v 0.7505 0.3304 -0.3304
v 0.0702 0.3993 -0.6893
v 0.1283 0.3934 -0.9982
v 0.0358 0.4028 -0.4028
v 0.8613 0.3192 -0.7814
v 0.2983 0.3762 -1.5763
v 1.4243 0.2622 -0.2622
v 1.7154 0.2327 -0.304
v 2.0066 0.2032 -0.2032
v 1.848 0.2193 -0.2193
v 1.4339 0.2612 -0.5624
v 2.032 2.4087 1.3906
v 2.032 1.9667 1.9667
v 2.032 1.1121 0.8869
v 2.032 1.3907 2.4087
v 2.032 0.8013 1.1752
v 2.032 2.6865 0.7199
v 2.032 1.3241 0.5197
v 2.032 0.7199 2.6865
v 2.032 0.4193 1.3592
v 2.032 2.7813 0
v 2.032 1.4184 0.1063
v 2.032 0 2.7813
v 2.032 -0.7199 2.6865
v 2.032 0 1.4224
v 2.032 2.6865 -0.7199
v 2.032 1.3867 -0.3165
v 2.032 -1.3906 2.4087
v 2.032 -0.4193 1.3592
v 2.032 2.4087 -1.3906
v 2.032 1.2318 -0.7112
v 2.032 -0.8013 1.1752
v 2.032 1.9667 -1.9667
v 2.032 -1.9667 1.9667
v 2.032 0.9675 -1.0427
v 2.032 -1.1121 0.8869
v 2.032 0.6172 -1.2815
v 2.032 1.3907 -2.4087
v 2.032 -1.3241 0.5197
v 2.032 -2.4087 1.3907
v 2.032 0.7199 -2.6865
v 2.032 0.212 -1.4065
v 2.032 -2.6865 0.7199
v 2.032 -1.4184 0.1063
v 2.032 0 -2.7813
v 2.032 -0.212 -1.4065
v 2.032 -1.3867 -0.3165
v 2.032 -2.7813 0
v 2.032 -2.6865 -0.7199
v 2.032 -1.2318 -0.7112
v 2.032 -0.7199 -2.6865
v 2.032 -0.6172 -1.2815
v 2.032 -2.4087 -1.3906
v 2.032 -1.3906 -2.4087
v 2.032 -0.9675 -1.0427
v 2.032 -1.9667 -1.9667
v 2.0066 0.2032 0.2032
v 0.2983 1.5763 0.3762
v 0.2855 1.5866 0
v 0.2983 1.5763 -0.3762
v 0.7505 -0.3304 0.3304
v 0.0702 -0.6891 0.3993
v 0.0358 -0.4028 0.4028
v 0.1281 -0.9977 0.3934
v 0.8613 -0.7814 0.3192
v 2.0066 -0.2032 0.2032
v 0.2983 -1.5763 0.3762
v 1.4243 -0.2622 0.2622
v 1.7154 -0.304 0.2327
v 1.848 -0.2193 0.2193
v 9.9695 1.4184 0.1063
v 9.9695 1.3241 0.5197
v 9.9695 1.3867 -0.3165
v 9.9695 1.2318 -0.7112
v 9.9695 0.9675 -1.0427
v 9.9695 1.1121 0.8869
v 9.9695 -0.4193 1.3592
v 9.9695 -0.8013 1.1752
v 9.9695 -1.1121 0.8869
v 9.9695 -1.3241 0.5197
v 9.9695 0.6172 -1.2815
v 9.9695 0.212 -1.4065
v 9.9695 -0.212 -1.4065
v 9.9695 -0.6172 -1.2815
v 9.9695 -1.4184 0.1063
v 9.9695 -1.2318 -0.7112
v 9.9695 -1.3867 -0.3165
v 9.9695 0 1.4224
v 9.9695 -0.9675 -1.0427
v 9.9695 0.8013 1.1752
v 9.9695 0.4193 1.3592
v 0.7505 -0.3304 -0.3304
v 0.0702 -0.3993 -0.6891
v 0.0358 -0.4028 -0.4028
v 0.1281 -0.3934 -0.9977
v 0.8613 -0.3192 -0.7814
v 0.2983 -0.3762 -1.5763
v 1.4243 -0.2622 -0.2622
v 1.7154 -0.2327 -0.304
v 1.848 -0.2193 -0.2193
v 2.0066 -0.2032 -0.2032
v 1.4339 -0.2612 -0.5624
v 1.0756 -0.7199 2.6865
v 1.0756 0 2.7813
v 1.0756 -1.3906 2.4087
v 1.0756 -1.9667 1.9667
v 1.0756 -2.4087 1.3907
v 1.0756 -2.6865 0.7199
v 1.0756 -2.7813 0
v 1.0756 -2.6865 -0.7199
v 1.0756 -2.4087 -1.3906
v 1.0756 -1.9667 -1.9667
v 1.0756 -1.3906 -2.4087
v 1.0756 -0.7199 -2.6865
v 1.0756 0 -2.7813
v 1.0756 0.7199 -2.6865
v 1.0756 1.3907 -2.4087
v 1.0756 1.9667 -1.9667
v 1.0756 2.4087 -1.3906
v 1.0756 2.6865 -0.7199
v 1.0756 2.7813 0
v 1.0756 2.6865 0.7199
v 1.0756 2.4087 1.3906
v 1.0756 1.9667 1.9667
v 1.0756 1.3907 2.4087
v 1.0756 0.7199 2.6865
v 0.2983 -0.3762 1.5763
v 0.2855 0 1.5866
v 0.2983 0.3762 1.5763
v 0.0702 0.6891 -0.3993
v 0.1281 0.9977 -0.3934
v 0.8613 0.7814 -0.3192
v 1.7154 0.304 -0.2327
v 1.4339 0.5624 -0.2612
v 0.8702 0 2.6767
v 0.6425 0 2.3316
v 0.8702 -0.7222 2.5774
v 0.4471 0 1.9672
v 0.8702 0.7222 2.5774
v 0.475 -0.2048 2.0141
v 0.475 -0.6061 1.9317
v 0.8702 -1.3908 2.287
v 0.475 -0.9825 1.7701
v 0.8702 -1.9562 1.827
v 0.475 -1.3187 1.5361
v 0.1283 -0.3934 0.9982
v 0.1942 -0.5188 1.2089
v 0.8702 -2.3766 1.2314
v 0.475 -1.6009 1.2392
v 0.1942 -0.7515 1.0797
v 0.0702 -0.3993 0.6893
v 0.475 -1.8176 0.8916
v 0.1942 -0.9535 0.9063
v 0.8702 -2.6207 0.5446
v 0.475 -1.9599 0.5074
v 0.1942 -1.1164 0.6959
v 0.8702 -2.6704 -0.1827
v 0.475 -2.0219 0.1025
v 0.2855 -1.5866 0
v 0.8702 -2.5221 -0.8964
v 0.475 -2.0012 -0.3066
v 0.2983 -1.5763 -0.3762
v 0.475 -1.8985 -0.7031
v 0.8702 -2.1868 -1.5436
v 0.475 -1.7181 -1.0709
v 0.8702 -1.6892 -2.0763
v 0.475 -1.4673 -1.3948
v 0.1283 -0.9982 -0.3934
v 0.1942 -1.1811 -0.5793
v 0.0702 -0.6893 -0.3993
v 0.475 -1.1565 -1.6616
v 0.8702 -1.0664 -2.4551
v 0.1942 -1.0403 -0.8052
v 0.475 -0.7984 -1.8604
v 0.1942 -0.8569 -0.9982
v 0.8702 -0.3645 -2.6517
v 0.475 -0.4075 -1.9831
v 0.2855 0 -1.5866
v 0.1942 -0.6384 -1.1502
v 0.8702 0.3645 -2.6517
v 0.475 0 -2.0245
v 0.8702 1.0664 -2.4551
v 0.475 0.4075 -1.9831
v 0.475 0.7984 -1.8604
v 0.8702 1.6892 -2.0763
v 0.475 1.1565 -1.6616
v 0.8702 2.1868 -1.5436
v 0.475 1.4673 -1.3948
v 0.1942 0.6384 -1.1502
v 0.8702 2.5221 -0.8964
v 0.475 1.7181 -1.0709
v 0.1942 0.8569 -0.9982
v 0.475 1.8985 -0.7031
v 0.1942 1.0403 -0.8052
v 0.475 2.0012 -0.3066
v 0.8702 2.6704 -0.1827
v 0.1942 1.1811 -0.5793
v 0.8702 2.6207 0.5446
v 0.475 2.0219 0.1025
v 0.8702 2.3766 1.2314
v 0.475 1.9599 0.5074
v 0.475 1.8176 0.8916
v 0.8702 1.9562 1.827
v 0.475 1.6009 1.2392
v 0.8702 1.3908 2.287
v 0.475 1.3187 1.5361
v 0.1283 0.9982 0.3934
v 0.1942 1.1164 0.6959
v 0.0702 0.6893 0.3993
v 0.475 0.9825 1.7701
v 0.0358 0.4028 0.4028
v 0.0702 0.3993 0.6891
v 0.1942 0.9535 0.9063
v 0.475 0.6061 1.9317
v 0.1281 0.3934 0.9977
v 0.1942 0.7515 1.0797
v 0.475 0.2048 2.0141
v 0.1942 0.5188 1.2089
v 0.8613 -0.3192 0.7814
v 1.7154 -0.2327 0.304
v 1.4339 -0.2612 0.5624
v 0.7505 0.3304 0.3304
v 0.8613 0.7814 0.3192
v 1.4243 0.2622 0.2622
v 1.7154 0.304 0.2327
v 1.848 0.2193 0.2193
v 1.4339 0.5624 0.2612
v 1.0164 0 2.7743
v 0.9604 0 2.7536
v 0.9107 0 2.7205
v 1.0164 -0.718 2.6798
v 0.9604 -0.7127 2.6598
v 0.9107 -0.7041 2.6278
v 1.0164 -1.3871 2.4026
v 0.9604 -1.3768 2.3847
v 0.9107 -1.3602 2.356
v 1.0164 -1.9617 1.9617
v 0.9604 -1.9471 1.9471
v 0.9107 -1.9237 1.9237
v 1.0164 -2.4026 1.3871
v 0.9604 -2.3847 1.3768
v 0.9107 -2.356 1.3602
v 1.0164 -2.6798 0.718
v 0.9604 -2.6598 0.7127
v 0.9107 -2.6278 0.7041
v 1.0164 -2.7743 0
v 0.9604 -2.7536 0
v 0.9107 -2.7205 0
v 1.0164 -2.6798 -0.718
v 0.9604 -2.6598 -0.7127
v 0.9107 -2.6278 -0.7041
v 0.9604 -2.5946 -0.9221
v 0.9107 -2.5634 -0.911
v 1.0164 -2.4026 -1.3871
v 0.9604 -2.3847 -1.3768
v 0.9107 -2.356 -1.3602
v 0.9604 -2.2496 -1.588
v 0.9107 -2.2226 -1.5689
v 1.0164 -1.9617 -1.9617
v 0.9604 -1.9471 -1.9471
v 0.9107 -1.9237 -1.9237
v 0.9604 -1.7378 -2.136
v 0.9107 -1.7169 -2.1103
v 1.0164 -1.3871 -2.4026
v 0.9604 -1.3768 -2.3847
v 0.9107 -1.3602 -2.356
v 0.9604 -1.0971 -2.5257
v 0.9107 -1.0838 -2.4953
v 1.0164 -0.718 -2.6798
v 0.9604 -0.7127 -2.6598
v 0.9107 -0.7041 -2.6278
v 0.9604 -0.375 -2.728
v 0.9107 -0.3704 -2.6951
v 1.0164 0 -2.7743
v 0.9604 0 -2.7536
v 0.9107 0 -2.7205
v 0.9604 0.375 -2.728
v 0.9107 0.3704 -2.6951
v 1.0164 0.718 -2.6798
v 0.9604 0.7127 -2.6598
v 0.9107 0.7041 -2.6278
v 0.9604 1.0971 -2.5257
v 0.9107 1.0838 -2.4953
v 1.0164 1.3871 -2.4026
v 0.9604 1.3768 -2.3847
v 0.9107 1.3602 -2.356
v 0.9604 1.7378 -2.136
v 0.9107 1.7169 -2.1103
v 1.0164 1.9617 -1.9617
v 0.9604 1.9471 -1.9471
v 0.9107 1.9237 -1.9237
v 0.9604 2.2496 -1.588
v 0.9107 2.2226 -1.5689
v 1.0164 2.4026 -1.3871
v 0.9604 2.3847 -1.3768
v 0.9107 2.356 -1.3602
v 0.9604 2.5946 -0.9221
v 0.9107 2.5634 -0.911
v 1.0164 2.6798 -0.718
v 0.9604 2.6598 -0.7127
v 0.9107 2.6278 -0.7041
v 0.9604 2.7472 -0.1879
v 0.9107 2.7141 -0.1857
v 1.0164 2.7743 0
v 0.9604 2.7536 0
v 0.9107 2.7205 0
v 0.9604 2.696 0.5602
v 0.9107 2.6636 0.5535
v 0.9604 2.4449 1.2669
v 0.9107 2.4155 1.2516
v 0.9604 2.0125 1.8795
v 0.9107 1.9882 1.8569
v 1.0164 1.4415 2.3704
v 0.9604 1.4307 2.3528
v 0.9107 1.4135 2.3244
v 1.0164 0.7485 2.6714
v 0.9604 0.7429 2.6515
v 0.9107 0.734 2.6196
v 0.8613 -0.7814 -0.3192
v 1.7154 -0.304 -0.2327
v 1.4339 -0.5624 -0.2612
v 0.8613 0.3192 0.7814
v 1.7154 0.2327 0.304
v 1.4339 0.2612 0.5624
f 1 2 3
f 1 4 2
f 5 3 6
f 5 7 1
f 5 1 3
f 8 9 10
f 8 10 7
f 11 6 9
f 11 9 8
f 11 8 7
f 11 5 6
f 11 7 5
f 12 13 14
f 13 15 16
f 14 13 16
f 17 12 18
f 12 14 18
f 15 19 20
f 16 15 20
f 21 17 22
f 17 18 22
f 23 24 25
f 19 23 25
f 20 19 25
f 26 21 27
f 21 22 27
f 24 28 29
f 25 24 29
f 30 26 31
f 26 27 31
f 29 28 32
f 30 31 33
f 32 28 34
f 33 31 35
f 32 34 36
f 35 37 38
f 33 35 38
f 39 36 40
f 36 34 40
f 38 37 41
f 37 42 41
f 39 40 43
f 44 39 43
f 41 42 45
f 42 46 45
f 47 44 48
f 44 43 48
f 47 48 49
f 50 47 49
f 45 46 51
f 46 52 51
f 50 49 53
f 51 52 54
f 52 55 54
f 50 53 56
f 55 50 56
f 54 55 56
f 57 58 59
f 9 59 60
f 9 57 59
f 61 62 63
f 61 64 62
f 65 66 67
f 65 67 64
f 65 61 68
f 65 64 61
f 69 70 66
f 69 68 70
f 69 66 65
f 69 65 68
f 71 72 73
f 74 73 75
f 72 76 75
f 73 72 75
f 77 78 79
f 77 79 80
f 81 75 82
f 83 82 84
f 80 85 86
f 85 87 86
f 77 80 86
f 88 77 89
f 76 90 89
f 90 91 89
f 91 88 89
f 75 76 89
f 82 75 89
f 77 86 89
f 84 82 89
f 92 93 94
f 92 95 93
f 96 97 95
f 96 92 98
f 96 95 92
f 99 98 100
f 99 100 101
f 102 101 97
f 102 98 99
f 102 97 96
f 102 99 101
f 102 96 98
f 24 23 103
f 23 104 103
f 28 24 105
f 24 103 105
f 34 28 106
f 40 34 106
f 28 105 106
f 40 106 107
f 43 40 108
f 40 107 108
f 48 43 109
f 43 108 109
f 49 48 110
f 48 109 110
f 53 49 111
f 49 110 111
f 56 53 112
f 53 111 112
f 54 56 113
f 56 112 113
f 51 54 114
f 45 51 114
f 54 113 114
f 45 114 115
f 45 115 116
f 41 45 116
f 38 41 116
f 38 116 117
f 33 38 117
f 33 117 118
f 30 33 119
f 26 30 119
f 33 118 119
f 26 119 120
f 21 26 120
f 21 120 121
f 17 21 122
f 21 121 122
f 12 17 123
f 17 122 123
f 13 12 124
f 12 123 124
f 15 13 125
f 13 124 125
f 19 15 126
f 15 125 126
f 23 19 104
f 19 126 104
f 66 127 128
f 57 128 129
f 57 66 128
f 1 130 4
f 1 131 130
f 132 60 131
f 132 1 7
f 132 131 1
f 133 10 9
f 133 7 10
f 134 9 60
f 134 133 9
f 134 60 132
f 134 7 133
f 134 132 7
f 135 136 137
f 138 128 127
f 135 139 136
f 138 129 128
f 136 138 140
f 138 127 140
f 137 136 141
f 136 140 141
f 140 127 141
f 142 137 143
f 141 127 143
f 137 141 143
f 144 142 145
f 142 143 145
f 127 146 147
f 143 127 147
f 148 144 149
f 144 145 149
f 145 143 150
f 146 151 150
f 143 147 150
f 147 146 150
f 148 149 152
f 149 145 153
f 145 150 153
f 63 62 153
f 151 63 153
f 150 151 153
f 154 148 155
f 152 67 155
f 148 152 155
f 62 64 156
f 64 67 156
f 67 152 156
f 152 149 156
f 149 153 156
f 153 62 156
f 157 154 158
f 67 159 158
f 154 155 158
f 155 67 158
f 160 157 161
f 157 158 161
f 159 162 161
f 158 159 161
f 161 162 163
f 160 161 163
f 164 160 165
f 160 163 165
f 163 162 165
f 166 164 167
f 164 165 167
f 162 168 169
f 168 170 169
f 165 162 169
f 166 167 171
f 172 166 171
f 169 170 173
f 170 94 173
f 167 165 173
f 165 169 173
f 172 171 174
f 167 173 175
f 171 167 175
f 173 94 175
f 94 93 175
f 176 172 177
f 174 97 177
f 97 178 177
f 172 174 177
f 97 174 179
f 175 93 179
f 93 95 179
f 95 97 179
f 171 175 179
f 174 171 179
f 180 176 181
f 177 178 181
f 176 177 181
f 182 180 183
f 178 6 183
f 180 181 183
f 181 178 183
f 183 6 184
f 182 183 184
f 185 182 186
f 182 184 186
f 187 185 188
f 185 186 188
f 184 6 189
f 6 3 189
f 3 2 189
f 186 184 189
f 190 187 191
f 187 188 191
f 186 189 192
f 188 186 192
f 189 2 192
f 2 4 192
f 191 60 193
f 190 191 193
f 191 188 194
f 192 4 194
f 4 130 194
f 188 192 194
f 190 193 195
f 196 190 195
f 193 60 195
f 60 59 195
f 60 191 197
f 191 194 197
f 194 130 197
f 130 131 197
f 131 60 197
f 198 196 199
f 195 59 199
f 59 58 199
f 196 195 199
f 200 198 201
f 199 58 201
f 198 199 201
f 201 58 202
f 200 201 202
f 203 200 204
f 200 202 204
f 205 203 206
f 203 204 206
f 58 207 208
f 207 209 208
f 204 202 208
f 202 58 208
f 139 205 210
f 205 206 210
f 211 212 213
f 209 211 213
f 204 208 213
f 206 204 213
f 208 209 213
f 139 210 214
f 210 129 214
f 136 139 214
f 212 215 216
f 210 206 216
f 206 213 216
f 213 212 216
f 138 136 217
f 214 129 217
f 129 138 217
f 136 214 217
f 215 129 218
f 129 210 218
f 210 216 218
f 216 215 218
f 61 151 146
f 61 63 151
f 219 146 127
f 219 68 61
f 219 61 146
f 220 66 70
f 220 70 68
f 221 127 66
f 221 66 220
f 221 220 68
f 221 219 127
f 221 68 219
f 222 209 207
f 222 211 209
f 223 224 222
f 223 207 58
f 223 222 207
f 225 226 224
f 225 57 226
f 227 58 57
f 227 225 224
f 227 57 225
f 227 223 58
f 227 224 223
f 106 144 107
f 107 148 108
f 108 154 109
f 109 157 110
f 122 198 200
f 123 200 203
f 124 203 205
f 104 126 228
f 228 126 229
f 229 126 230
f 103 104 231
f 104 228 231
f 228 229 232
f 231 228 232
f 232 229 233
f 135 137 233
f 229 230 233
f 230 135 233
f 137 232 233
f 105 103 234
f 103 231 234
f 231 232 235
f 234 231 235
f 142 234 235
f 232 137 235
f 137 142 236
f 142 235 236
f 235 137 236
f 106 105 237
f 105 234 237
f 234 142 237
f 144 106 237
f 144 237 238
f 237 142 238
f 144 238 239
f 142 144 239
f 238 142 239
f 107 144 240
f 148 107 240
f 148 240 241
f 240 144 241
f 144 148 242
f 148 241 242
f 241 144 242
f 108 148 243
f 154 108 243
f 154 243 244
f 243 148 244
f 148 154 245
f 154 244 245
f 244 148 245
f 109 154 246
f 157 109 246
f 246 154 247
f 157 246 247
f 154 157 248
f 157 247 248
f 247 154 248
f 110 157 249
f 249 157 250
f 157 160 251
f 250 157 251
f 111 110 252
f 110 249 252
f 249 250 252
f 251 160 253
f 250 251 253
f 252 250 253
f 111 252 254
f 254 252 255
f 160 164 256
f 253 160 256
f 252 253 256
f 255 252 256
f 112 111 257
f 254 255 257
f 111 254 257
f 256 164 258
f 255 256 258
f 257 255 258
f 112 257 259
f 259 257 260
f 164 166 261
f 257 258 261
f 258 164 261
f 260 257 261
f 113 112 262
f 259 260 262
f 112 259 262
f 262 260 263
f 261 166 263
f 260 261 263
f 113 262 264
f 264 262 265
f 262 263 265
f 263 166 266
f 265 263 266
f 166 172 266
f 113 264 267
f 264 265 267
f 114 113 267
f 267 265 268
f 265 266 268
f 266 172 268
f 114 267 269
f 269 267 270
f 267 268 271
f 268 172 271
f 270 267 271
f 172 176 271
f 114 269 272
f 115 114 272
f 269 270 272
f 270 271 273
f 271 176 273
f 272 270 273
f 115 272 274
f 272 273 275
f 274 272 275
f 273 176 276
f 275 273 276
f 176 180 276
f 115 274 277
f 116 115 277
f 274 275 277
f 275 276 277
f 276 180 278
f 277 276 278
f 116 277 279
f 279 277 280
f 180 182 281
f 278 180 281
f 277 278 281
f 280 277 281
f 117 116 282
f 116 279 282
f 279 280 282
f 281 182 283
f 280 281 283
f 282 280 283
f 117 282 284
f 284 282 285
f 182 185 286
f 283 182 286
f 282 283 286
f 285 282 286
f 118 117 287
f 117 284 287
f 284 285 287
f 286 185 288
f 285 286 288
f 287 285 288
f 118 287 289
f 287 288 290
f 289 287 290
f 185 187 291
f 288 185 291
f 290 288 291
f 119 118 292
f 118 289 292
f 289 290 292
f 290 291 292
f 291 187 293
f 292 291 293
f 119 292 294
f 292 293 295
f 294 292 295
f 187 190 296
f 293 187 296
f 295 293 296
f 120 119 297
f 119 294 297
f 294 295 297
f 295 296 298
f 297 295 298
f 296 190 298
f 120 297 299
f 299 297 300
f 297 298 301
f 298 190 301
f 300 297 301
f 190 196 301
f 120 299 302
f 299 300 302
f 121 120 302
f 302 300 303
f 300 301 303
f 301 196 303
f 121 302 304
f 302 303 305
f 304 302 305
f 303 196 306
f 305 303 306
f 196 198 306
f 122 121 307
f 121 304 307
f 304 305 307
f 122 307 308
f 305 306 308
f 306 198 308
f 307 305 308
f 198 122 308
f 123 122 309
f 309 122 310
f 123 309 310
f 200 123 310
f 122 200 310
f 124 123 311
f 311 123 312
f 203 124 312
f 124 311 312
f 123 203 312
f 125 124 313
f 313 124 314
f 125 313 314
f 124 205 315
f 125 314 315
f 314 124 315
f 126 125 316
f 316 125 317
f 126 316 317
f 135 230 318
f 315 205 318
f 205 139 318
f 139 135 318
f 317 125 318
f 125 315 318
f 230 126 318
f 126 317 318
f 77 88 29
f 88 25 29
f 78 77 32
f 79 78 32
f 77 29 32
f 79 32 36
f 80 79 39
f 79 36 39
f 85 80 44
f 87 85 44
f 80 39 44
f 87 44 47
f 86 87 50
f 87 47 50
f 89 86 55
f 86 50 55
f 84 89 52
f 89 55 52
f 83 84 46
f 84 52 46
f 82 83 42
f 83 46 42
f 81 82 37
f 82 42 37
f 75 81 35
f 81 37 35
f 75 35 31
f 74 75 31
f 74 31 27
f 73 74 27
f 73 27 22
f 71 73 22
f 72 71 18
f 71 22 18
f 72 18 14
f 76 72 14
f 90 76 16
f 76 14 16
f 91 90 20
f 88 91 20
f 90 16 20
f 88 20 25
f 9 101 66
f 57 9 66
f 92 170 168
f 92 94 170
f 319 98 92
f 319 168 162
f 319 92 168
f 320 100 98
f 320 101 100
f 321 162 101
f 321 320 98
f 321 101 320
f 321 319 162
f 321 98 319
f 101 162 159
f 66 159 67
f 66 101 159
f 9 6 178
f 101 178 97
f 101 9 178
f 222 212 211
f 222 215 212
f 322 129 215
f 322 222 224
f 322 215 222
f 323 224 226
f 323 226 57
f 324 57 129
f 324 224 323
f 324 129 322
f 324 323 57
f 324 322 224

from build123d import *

# Parameters (mm, degrees)
CIRPATTERN1_COUNT = 2
CIRPATTERN1_ANGLE = 90


with BuildPart() as part:
    # BodySke → Base-Revolve (revolve)
    with BuildSketch(Plane.XY, mode=Mode.PRIVATE) as base_revolve_sk:
        with BuildLine():
            Line((2.032, 1.4224), (2.032, 2.7813))
            Line((2.032, 2.7813), (1.075646615, 2.7813))
            ThreePointArc((1.075646615, 2.7813), (0.960371669, 2.753635341), (0.87020729, 2.676667612))
            ThreePointArc((0.87020729, 2.676667612), (0.223015279, 1.407285528), (0, 0))
            Line((0, 0), (9.9695, 0))
            Line((9.9695, 0), (9.9695, 1.4224))
            Line((9.9695, 1.4224), (2.032, 1.4224))
        make_face()
    revolve(base_revolve_sk.sketch.rotate(Axis((-25.4, 0, 0), (1, 0, 0)), 90), axis=Axis((-25.4, 0, 0), (1, 0, 0)))

    # Sketch3 → Cut-Loft1 section 0
    with BuildSketch(Plane(origin=(0, 0, 0), x_dir=(0, 0, -1), z_dir=(1, 0, 0))):
        with BuildLine():
            Line((0.4064, -1.8161), (-0.4064, -1.8161))
            Line((-0.4064, -1.8161), (-0.4064, 1.8161))
            Line((-0.4064, 1.8161), (0.4064, 1.8161))
            Line((0.4064, 1.8161), (0.4064, -1.8161))
        make_face()
    # Sketch4 → Cut-Loft1 section 1
    with BuildSketch(Plane(origin=(2.0066, 0, 0), x_dir=(0, 0, -1), z_dir=(1, 0, 0))):
        with BuildLine():
            Line((0.2032, -0.2032), (-0.2032, -0.2032))
            Line((-0.2032, -0.2032), (-0.2032, 0.2032))
            Line((-0.2032, 0.2032), (0.2032, 0.2032))
            Line((0.2032, 0.2032), (0.2032, -0.2032))
        make_face()
    cut_loft1 = loft(mode=Mode.SUBTRACT)

    # CirPattern1: Cut-Loft1 ×2 about axis
    cirpattern1_axis = Axis((0, 0, 0), (1, 0, 0))
    for i in range(1, CIRPATTERN1_COUNT):
        add(cut_loft1.rotate(cirpattern1_axis, i * CIRPATTERN1_ANGLE / (CIRPATTERN1_COUNT - 1)), mode=Mode.SUBTRACT)


solid = part.part
